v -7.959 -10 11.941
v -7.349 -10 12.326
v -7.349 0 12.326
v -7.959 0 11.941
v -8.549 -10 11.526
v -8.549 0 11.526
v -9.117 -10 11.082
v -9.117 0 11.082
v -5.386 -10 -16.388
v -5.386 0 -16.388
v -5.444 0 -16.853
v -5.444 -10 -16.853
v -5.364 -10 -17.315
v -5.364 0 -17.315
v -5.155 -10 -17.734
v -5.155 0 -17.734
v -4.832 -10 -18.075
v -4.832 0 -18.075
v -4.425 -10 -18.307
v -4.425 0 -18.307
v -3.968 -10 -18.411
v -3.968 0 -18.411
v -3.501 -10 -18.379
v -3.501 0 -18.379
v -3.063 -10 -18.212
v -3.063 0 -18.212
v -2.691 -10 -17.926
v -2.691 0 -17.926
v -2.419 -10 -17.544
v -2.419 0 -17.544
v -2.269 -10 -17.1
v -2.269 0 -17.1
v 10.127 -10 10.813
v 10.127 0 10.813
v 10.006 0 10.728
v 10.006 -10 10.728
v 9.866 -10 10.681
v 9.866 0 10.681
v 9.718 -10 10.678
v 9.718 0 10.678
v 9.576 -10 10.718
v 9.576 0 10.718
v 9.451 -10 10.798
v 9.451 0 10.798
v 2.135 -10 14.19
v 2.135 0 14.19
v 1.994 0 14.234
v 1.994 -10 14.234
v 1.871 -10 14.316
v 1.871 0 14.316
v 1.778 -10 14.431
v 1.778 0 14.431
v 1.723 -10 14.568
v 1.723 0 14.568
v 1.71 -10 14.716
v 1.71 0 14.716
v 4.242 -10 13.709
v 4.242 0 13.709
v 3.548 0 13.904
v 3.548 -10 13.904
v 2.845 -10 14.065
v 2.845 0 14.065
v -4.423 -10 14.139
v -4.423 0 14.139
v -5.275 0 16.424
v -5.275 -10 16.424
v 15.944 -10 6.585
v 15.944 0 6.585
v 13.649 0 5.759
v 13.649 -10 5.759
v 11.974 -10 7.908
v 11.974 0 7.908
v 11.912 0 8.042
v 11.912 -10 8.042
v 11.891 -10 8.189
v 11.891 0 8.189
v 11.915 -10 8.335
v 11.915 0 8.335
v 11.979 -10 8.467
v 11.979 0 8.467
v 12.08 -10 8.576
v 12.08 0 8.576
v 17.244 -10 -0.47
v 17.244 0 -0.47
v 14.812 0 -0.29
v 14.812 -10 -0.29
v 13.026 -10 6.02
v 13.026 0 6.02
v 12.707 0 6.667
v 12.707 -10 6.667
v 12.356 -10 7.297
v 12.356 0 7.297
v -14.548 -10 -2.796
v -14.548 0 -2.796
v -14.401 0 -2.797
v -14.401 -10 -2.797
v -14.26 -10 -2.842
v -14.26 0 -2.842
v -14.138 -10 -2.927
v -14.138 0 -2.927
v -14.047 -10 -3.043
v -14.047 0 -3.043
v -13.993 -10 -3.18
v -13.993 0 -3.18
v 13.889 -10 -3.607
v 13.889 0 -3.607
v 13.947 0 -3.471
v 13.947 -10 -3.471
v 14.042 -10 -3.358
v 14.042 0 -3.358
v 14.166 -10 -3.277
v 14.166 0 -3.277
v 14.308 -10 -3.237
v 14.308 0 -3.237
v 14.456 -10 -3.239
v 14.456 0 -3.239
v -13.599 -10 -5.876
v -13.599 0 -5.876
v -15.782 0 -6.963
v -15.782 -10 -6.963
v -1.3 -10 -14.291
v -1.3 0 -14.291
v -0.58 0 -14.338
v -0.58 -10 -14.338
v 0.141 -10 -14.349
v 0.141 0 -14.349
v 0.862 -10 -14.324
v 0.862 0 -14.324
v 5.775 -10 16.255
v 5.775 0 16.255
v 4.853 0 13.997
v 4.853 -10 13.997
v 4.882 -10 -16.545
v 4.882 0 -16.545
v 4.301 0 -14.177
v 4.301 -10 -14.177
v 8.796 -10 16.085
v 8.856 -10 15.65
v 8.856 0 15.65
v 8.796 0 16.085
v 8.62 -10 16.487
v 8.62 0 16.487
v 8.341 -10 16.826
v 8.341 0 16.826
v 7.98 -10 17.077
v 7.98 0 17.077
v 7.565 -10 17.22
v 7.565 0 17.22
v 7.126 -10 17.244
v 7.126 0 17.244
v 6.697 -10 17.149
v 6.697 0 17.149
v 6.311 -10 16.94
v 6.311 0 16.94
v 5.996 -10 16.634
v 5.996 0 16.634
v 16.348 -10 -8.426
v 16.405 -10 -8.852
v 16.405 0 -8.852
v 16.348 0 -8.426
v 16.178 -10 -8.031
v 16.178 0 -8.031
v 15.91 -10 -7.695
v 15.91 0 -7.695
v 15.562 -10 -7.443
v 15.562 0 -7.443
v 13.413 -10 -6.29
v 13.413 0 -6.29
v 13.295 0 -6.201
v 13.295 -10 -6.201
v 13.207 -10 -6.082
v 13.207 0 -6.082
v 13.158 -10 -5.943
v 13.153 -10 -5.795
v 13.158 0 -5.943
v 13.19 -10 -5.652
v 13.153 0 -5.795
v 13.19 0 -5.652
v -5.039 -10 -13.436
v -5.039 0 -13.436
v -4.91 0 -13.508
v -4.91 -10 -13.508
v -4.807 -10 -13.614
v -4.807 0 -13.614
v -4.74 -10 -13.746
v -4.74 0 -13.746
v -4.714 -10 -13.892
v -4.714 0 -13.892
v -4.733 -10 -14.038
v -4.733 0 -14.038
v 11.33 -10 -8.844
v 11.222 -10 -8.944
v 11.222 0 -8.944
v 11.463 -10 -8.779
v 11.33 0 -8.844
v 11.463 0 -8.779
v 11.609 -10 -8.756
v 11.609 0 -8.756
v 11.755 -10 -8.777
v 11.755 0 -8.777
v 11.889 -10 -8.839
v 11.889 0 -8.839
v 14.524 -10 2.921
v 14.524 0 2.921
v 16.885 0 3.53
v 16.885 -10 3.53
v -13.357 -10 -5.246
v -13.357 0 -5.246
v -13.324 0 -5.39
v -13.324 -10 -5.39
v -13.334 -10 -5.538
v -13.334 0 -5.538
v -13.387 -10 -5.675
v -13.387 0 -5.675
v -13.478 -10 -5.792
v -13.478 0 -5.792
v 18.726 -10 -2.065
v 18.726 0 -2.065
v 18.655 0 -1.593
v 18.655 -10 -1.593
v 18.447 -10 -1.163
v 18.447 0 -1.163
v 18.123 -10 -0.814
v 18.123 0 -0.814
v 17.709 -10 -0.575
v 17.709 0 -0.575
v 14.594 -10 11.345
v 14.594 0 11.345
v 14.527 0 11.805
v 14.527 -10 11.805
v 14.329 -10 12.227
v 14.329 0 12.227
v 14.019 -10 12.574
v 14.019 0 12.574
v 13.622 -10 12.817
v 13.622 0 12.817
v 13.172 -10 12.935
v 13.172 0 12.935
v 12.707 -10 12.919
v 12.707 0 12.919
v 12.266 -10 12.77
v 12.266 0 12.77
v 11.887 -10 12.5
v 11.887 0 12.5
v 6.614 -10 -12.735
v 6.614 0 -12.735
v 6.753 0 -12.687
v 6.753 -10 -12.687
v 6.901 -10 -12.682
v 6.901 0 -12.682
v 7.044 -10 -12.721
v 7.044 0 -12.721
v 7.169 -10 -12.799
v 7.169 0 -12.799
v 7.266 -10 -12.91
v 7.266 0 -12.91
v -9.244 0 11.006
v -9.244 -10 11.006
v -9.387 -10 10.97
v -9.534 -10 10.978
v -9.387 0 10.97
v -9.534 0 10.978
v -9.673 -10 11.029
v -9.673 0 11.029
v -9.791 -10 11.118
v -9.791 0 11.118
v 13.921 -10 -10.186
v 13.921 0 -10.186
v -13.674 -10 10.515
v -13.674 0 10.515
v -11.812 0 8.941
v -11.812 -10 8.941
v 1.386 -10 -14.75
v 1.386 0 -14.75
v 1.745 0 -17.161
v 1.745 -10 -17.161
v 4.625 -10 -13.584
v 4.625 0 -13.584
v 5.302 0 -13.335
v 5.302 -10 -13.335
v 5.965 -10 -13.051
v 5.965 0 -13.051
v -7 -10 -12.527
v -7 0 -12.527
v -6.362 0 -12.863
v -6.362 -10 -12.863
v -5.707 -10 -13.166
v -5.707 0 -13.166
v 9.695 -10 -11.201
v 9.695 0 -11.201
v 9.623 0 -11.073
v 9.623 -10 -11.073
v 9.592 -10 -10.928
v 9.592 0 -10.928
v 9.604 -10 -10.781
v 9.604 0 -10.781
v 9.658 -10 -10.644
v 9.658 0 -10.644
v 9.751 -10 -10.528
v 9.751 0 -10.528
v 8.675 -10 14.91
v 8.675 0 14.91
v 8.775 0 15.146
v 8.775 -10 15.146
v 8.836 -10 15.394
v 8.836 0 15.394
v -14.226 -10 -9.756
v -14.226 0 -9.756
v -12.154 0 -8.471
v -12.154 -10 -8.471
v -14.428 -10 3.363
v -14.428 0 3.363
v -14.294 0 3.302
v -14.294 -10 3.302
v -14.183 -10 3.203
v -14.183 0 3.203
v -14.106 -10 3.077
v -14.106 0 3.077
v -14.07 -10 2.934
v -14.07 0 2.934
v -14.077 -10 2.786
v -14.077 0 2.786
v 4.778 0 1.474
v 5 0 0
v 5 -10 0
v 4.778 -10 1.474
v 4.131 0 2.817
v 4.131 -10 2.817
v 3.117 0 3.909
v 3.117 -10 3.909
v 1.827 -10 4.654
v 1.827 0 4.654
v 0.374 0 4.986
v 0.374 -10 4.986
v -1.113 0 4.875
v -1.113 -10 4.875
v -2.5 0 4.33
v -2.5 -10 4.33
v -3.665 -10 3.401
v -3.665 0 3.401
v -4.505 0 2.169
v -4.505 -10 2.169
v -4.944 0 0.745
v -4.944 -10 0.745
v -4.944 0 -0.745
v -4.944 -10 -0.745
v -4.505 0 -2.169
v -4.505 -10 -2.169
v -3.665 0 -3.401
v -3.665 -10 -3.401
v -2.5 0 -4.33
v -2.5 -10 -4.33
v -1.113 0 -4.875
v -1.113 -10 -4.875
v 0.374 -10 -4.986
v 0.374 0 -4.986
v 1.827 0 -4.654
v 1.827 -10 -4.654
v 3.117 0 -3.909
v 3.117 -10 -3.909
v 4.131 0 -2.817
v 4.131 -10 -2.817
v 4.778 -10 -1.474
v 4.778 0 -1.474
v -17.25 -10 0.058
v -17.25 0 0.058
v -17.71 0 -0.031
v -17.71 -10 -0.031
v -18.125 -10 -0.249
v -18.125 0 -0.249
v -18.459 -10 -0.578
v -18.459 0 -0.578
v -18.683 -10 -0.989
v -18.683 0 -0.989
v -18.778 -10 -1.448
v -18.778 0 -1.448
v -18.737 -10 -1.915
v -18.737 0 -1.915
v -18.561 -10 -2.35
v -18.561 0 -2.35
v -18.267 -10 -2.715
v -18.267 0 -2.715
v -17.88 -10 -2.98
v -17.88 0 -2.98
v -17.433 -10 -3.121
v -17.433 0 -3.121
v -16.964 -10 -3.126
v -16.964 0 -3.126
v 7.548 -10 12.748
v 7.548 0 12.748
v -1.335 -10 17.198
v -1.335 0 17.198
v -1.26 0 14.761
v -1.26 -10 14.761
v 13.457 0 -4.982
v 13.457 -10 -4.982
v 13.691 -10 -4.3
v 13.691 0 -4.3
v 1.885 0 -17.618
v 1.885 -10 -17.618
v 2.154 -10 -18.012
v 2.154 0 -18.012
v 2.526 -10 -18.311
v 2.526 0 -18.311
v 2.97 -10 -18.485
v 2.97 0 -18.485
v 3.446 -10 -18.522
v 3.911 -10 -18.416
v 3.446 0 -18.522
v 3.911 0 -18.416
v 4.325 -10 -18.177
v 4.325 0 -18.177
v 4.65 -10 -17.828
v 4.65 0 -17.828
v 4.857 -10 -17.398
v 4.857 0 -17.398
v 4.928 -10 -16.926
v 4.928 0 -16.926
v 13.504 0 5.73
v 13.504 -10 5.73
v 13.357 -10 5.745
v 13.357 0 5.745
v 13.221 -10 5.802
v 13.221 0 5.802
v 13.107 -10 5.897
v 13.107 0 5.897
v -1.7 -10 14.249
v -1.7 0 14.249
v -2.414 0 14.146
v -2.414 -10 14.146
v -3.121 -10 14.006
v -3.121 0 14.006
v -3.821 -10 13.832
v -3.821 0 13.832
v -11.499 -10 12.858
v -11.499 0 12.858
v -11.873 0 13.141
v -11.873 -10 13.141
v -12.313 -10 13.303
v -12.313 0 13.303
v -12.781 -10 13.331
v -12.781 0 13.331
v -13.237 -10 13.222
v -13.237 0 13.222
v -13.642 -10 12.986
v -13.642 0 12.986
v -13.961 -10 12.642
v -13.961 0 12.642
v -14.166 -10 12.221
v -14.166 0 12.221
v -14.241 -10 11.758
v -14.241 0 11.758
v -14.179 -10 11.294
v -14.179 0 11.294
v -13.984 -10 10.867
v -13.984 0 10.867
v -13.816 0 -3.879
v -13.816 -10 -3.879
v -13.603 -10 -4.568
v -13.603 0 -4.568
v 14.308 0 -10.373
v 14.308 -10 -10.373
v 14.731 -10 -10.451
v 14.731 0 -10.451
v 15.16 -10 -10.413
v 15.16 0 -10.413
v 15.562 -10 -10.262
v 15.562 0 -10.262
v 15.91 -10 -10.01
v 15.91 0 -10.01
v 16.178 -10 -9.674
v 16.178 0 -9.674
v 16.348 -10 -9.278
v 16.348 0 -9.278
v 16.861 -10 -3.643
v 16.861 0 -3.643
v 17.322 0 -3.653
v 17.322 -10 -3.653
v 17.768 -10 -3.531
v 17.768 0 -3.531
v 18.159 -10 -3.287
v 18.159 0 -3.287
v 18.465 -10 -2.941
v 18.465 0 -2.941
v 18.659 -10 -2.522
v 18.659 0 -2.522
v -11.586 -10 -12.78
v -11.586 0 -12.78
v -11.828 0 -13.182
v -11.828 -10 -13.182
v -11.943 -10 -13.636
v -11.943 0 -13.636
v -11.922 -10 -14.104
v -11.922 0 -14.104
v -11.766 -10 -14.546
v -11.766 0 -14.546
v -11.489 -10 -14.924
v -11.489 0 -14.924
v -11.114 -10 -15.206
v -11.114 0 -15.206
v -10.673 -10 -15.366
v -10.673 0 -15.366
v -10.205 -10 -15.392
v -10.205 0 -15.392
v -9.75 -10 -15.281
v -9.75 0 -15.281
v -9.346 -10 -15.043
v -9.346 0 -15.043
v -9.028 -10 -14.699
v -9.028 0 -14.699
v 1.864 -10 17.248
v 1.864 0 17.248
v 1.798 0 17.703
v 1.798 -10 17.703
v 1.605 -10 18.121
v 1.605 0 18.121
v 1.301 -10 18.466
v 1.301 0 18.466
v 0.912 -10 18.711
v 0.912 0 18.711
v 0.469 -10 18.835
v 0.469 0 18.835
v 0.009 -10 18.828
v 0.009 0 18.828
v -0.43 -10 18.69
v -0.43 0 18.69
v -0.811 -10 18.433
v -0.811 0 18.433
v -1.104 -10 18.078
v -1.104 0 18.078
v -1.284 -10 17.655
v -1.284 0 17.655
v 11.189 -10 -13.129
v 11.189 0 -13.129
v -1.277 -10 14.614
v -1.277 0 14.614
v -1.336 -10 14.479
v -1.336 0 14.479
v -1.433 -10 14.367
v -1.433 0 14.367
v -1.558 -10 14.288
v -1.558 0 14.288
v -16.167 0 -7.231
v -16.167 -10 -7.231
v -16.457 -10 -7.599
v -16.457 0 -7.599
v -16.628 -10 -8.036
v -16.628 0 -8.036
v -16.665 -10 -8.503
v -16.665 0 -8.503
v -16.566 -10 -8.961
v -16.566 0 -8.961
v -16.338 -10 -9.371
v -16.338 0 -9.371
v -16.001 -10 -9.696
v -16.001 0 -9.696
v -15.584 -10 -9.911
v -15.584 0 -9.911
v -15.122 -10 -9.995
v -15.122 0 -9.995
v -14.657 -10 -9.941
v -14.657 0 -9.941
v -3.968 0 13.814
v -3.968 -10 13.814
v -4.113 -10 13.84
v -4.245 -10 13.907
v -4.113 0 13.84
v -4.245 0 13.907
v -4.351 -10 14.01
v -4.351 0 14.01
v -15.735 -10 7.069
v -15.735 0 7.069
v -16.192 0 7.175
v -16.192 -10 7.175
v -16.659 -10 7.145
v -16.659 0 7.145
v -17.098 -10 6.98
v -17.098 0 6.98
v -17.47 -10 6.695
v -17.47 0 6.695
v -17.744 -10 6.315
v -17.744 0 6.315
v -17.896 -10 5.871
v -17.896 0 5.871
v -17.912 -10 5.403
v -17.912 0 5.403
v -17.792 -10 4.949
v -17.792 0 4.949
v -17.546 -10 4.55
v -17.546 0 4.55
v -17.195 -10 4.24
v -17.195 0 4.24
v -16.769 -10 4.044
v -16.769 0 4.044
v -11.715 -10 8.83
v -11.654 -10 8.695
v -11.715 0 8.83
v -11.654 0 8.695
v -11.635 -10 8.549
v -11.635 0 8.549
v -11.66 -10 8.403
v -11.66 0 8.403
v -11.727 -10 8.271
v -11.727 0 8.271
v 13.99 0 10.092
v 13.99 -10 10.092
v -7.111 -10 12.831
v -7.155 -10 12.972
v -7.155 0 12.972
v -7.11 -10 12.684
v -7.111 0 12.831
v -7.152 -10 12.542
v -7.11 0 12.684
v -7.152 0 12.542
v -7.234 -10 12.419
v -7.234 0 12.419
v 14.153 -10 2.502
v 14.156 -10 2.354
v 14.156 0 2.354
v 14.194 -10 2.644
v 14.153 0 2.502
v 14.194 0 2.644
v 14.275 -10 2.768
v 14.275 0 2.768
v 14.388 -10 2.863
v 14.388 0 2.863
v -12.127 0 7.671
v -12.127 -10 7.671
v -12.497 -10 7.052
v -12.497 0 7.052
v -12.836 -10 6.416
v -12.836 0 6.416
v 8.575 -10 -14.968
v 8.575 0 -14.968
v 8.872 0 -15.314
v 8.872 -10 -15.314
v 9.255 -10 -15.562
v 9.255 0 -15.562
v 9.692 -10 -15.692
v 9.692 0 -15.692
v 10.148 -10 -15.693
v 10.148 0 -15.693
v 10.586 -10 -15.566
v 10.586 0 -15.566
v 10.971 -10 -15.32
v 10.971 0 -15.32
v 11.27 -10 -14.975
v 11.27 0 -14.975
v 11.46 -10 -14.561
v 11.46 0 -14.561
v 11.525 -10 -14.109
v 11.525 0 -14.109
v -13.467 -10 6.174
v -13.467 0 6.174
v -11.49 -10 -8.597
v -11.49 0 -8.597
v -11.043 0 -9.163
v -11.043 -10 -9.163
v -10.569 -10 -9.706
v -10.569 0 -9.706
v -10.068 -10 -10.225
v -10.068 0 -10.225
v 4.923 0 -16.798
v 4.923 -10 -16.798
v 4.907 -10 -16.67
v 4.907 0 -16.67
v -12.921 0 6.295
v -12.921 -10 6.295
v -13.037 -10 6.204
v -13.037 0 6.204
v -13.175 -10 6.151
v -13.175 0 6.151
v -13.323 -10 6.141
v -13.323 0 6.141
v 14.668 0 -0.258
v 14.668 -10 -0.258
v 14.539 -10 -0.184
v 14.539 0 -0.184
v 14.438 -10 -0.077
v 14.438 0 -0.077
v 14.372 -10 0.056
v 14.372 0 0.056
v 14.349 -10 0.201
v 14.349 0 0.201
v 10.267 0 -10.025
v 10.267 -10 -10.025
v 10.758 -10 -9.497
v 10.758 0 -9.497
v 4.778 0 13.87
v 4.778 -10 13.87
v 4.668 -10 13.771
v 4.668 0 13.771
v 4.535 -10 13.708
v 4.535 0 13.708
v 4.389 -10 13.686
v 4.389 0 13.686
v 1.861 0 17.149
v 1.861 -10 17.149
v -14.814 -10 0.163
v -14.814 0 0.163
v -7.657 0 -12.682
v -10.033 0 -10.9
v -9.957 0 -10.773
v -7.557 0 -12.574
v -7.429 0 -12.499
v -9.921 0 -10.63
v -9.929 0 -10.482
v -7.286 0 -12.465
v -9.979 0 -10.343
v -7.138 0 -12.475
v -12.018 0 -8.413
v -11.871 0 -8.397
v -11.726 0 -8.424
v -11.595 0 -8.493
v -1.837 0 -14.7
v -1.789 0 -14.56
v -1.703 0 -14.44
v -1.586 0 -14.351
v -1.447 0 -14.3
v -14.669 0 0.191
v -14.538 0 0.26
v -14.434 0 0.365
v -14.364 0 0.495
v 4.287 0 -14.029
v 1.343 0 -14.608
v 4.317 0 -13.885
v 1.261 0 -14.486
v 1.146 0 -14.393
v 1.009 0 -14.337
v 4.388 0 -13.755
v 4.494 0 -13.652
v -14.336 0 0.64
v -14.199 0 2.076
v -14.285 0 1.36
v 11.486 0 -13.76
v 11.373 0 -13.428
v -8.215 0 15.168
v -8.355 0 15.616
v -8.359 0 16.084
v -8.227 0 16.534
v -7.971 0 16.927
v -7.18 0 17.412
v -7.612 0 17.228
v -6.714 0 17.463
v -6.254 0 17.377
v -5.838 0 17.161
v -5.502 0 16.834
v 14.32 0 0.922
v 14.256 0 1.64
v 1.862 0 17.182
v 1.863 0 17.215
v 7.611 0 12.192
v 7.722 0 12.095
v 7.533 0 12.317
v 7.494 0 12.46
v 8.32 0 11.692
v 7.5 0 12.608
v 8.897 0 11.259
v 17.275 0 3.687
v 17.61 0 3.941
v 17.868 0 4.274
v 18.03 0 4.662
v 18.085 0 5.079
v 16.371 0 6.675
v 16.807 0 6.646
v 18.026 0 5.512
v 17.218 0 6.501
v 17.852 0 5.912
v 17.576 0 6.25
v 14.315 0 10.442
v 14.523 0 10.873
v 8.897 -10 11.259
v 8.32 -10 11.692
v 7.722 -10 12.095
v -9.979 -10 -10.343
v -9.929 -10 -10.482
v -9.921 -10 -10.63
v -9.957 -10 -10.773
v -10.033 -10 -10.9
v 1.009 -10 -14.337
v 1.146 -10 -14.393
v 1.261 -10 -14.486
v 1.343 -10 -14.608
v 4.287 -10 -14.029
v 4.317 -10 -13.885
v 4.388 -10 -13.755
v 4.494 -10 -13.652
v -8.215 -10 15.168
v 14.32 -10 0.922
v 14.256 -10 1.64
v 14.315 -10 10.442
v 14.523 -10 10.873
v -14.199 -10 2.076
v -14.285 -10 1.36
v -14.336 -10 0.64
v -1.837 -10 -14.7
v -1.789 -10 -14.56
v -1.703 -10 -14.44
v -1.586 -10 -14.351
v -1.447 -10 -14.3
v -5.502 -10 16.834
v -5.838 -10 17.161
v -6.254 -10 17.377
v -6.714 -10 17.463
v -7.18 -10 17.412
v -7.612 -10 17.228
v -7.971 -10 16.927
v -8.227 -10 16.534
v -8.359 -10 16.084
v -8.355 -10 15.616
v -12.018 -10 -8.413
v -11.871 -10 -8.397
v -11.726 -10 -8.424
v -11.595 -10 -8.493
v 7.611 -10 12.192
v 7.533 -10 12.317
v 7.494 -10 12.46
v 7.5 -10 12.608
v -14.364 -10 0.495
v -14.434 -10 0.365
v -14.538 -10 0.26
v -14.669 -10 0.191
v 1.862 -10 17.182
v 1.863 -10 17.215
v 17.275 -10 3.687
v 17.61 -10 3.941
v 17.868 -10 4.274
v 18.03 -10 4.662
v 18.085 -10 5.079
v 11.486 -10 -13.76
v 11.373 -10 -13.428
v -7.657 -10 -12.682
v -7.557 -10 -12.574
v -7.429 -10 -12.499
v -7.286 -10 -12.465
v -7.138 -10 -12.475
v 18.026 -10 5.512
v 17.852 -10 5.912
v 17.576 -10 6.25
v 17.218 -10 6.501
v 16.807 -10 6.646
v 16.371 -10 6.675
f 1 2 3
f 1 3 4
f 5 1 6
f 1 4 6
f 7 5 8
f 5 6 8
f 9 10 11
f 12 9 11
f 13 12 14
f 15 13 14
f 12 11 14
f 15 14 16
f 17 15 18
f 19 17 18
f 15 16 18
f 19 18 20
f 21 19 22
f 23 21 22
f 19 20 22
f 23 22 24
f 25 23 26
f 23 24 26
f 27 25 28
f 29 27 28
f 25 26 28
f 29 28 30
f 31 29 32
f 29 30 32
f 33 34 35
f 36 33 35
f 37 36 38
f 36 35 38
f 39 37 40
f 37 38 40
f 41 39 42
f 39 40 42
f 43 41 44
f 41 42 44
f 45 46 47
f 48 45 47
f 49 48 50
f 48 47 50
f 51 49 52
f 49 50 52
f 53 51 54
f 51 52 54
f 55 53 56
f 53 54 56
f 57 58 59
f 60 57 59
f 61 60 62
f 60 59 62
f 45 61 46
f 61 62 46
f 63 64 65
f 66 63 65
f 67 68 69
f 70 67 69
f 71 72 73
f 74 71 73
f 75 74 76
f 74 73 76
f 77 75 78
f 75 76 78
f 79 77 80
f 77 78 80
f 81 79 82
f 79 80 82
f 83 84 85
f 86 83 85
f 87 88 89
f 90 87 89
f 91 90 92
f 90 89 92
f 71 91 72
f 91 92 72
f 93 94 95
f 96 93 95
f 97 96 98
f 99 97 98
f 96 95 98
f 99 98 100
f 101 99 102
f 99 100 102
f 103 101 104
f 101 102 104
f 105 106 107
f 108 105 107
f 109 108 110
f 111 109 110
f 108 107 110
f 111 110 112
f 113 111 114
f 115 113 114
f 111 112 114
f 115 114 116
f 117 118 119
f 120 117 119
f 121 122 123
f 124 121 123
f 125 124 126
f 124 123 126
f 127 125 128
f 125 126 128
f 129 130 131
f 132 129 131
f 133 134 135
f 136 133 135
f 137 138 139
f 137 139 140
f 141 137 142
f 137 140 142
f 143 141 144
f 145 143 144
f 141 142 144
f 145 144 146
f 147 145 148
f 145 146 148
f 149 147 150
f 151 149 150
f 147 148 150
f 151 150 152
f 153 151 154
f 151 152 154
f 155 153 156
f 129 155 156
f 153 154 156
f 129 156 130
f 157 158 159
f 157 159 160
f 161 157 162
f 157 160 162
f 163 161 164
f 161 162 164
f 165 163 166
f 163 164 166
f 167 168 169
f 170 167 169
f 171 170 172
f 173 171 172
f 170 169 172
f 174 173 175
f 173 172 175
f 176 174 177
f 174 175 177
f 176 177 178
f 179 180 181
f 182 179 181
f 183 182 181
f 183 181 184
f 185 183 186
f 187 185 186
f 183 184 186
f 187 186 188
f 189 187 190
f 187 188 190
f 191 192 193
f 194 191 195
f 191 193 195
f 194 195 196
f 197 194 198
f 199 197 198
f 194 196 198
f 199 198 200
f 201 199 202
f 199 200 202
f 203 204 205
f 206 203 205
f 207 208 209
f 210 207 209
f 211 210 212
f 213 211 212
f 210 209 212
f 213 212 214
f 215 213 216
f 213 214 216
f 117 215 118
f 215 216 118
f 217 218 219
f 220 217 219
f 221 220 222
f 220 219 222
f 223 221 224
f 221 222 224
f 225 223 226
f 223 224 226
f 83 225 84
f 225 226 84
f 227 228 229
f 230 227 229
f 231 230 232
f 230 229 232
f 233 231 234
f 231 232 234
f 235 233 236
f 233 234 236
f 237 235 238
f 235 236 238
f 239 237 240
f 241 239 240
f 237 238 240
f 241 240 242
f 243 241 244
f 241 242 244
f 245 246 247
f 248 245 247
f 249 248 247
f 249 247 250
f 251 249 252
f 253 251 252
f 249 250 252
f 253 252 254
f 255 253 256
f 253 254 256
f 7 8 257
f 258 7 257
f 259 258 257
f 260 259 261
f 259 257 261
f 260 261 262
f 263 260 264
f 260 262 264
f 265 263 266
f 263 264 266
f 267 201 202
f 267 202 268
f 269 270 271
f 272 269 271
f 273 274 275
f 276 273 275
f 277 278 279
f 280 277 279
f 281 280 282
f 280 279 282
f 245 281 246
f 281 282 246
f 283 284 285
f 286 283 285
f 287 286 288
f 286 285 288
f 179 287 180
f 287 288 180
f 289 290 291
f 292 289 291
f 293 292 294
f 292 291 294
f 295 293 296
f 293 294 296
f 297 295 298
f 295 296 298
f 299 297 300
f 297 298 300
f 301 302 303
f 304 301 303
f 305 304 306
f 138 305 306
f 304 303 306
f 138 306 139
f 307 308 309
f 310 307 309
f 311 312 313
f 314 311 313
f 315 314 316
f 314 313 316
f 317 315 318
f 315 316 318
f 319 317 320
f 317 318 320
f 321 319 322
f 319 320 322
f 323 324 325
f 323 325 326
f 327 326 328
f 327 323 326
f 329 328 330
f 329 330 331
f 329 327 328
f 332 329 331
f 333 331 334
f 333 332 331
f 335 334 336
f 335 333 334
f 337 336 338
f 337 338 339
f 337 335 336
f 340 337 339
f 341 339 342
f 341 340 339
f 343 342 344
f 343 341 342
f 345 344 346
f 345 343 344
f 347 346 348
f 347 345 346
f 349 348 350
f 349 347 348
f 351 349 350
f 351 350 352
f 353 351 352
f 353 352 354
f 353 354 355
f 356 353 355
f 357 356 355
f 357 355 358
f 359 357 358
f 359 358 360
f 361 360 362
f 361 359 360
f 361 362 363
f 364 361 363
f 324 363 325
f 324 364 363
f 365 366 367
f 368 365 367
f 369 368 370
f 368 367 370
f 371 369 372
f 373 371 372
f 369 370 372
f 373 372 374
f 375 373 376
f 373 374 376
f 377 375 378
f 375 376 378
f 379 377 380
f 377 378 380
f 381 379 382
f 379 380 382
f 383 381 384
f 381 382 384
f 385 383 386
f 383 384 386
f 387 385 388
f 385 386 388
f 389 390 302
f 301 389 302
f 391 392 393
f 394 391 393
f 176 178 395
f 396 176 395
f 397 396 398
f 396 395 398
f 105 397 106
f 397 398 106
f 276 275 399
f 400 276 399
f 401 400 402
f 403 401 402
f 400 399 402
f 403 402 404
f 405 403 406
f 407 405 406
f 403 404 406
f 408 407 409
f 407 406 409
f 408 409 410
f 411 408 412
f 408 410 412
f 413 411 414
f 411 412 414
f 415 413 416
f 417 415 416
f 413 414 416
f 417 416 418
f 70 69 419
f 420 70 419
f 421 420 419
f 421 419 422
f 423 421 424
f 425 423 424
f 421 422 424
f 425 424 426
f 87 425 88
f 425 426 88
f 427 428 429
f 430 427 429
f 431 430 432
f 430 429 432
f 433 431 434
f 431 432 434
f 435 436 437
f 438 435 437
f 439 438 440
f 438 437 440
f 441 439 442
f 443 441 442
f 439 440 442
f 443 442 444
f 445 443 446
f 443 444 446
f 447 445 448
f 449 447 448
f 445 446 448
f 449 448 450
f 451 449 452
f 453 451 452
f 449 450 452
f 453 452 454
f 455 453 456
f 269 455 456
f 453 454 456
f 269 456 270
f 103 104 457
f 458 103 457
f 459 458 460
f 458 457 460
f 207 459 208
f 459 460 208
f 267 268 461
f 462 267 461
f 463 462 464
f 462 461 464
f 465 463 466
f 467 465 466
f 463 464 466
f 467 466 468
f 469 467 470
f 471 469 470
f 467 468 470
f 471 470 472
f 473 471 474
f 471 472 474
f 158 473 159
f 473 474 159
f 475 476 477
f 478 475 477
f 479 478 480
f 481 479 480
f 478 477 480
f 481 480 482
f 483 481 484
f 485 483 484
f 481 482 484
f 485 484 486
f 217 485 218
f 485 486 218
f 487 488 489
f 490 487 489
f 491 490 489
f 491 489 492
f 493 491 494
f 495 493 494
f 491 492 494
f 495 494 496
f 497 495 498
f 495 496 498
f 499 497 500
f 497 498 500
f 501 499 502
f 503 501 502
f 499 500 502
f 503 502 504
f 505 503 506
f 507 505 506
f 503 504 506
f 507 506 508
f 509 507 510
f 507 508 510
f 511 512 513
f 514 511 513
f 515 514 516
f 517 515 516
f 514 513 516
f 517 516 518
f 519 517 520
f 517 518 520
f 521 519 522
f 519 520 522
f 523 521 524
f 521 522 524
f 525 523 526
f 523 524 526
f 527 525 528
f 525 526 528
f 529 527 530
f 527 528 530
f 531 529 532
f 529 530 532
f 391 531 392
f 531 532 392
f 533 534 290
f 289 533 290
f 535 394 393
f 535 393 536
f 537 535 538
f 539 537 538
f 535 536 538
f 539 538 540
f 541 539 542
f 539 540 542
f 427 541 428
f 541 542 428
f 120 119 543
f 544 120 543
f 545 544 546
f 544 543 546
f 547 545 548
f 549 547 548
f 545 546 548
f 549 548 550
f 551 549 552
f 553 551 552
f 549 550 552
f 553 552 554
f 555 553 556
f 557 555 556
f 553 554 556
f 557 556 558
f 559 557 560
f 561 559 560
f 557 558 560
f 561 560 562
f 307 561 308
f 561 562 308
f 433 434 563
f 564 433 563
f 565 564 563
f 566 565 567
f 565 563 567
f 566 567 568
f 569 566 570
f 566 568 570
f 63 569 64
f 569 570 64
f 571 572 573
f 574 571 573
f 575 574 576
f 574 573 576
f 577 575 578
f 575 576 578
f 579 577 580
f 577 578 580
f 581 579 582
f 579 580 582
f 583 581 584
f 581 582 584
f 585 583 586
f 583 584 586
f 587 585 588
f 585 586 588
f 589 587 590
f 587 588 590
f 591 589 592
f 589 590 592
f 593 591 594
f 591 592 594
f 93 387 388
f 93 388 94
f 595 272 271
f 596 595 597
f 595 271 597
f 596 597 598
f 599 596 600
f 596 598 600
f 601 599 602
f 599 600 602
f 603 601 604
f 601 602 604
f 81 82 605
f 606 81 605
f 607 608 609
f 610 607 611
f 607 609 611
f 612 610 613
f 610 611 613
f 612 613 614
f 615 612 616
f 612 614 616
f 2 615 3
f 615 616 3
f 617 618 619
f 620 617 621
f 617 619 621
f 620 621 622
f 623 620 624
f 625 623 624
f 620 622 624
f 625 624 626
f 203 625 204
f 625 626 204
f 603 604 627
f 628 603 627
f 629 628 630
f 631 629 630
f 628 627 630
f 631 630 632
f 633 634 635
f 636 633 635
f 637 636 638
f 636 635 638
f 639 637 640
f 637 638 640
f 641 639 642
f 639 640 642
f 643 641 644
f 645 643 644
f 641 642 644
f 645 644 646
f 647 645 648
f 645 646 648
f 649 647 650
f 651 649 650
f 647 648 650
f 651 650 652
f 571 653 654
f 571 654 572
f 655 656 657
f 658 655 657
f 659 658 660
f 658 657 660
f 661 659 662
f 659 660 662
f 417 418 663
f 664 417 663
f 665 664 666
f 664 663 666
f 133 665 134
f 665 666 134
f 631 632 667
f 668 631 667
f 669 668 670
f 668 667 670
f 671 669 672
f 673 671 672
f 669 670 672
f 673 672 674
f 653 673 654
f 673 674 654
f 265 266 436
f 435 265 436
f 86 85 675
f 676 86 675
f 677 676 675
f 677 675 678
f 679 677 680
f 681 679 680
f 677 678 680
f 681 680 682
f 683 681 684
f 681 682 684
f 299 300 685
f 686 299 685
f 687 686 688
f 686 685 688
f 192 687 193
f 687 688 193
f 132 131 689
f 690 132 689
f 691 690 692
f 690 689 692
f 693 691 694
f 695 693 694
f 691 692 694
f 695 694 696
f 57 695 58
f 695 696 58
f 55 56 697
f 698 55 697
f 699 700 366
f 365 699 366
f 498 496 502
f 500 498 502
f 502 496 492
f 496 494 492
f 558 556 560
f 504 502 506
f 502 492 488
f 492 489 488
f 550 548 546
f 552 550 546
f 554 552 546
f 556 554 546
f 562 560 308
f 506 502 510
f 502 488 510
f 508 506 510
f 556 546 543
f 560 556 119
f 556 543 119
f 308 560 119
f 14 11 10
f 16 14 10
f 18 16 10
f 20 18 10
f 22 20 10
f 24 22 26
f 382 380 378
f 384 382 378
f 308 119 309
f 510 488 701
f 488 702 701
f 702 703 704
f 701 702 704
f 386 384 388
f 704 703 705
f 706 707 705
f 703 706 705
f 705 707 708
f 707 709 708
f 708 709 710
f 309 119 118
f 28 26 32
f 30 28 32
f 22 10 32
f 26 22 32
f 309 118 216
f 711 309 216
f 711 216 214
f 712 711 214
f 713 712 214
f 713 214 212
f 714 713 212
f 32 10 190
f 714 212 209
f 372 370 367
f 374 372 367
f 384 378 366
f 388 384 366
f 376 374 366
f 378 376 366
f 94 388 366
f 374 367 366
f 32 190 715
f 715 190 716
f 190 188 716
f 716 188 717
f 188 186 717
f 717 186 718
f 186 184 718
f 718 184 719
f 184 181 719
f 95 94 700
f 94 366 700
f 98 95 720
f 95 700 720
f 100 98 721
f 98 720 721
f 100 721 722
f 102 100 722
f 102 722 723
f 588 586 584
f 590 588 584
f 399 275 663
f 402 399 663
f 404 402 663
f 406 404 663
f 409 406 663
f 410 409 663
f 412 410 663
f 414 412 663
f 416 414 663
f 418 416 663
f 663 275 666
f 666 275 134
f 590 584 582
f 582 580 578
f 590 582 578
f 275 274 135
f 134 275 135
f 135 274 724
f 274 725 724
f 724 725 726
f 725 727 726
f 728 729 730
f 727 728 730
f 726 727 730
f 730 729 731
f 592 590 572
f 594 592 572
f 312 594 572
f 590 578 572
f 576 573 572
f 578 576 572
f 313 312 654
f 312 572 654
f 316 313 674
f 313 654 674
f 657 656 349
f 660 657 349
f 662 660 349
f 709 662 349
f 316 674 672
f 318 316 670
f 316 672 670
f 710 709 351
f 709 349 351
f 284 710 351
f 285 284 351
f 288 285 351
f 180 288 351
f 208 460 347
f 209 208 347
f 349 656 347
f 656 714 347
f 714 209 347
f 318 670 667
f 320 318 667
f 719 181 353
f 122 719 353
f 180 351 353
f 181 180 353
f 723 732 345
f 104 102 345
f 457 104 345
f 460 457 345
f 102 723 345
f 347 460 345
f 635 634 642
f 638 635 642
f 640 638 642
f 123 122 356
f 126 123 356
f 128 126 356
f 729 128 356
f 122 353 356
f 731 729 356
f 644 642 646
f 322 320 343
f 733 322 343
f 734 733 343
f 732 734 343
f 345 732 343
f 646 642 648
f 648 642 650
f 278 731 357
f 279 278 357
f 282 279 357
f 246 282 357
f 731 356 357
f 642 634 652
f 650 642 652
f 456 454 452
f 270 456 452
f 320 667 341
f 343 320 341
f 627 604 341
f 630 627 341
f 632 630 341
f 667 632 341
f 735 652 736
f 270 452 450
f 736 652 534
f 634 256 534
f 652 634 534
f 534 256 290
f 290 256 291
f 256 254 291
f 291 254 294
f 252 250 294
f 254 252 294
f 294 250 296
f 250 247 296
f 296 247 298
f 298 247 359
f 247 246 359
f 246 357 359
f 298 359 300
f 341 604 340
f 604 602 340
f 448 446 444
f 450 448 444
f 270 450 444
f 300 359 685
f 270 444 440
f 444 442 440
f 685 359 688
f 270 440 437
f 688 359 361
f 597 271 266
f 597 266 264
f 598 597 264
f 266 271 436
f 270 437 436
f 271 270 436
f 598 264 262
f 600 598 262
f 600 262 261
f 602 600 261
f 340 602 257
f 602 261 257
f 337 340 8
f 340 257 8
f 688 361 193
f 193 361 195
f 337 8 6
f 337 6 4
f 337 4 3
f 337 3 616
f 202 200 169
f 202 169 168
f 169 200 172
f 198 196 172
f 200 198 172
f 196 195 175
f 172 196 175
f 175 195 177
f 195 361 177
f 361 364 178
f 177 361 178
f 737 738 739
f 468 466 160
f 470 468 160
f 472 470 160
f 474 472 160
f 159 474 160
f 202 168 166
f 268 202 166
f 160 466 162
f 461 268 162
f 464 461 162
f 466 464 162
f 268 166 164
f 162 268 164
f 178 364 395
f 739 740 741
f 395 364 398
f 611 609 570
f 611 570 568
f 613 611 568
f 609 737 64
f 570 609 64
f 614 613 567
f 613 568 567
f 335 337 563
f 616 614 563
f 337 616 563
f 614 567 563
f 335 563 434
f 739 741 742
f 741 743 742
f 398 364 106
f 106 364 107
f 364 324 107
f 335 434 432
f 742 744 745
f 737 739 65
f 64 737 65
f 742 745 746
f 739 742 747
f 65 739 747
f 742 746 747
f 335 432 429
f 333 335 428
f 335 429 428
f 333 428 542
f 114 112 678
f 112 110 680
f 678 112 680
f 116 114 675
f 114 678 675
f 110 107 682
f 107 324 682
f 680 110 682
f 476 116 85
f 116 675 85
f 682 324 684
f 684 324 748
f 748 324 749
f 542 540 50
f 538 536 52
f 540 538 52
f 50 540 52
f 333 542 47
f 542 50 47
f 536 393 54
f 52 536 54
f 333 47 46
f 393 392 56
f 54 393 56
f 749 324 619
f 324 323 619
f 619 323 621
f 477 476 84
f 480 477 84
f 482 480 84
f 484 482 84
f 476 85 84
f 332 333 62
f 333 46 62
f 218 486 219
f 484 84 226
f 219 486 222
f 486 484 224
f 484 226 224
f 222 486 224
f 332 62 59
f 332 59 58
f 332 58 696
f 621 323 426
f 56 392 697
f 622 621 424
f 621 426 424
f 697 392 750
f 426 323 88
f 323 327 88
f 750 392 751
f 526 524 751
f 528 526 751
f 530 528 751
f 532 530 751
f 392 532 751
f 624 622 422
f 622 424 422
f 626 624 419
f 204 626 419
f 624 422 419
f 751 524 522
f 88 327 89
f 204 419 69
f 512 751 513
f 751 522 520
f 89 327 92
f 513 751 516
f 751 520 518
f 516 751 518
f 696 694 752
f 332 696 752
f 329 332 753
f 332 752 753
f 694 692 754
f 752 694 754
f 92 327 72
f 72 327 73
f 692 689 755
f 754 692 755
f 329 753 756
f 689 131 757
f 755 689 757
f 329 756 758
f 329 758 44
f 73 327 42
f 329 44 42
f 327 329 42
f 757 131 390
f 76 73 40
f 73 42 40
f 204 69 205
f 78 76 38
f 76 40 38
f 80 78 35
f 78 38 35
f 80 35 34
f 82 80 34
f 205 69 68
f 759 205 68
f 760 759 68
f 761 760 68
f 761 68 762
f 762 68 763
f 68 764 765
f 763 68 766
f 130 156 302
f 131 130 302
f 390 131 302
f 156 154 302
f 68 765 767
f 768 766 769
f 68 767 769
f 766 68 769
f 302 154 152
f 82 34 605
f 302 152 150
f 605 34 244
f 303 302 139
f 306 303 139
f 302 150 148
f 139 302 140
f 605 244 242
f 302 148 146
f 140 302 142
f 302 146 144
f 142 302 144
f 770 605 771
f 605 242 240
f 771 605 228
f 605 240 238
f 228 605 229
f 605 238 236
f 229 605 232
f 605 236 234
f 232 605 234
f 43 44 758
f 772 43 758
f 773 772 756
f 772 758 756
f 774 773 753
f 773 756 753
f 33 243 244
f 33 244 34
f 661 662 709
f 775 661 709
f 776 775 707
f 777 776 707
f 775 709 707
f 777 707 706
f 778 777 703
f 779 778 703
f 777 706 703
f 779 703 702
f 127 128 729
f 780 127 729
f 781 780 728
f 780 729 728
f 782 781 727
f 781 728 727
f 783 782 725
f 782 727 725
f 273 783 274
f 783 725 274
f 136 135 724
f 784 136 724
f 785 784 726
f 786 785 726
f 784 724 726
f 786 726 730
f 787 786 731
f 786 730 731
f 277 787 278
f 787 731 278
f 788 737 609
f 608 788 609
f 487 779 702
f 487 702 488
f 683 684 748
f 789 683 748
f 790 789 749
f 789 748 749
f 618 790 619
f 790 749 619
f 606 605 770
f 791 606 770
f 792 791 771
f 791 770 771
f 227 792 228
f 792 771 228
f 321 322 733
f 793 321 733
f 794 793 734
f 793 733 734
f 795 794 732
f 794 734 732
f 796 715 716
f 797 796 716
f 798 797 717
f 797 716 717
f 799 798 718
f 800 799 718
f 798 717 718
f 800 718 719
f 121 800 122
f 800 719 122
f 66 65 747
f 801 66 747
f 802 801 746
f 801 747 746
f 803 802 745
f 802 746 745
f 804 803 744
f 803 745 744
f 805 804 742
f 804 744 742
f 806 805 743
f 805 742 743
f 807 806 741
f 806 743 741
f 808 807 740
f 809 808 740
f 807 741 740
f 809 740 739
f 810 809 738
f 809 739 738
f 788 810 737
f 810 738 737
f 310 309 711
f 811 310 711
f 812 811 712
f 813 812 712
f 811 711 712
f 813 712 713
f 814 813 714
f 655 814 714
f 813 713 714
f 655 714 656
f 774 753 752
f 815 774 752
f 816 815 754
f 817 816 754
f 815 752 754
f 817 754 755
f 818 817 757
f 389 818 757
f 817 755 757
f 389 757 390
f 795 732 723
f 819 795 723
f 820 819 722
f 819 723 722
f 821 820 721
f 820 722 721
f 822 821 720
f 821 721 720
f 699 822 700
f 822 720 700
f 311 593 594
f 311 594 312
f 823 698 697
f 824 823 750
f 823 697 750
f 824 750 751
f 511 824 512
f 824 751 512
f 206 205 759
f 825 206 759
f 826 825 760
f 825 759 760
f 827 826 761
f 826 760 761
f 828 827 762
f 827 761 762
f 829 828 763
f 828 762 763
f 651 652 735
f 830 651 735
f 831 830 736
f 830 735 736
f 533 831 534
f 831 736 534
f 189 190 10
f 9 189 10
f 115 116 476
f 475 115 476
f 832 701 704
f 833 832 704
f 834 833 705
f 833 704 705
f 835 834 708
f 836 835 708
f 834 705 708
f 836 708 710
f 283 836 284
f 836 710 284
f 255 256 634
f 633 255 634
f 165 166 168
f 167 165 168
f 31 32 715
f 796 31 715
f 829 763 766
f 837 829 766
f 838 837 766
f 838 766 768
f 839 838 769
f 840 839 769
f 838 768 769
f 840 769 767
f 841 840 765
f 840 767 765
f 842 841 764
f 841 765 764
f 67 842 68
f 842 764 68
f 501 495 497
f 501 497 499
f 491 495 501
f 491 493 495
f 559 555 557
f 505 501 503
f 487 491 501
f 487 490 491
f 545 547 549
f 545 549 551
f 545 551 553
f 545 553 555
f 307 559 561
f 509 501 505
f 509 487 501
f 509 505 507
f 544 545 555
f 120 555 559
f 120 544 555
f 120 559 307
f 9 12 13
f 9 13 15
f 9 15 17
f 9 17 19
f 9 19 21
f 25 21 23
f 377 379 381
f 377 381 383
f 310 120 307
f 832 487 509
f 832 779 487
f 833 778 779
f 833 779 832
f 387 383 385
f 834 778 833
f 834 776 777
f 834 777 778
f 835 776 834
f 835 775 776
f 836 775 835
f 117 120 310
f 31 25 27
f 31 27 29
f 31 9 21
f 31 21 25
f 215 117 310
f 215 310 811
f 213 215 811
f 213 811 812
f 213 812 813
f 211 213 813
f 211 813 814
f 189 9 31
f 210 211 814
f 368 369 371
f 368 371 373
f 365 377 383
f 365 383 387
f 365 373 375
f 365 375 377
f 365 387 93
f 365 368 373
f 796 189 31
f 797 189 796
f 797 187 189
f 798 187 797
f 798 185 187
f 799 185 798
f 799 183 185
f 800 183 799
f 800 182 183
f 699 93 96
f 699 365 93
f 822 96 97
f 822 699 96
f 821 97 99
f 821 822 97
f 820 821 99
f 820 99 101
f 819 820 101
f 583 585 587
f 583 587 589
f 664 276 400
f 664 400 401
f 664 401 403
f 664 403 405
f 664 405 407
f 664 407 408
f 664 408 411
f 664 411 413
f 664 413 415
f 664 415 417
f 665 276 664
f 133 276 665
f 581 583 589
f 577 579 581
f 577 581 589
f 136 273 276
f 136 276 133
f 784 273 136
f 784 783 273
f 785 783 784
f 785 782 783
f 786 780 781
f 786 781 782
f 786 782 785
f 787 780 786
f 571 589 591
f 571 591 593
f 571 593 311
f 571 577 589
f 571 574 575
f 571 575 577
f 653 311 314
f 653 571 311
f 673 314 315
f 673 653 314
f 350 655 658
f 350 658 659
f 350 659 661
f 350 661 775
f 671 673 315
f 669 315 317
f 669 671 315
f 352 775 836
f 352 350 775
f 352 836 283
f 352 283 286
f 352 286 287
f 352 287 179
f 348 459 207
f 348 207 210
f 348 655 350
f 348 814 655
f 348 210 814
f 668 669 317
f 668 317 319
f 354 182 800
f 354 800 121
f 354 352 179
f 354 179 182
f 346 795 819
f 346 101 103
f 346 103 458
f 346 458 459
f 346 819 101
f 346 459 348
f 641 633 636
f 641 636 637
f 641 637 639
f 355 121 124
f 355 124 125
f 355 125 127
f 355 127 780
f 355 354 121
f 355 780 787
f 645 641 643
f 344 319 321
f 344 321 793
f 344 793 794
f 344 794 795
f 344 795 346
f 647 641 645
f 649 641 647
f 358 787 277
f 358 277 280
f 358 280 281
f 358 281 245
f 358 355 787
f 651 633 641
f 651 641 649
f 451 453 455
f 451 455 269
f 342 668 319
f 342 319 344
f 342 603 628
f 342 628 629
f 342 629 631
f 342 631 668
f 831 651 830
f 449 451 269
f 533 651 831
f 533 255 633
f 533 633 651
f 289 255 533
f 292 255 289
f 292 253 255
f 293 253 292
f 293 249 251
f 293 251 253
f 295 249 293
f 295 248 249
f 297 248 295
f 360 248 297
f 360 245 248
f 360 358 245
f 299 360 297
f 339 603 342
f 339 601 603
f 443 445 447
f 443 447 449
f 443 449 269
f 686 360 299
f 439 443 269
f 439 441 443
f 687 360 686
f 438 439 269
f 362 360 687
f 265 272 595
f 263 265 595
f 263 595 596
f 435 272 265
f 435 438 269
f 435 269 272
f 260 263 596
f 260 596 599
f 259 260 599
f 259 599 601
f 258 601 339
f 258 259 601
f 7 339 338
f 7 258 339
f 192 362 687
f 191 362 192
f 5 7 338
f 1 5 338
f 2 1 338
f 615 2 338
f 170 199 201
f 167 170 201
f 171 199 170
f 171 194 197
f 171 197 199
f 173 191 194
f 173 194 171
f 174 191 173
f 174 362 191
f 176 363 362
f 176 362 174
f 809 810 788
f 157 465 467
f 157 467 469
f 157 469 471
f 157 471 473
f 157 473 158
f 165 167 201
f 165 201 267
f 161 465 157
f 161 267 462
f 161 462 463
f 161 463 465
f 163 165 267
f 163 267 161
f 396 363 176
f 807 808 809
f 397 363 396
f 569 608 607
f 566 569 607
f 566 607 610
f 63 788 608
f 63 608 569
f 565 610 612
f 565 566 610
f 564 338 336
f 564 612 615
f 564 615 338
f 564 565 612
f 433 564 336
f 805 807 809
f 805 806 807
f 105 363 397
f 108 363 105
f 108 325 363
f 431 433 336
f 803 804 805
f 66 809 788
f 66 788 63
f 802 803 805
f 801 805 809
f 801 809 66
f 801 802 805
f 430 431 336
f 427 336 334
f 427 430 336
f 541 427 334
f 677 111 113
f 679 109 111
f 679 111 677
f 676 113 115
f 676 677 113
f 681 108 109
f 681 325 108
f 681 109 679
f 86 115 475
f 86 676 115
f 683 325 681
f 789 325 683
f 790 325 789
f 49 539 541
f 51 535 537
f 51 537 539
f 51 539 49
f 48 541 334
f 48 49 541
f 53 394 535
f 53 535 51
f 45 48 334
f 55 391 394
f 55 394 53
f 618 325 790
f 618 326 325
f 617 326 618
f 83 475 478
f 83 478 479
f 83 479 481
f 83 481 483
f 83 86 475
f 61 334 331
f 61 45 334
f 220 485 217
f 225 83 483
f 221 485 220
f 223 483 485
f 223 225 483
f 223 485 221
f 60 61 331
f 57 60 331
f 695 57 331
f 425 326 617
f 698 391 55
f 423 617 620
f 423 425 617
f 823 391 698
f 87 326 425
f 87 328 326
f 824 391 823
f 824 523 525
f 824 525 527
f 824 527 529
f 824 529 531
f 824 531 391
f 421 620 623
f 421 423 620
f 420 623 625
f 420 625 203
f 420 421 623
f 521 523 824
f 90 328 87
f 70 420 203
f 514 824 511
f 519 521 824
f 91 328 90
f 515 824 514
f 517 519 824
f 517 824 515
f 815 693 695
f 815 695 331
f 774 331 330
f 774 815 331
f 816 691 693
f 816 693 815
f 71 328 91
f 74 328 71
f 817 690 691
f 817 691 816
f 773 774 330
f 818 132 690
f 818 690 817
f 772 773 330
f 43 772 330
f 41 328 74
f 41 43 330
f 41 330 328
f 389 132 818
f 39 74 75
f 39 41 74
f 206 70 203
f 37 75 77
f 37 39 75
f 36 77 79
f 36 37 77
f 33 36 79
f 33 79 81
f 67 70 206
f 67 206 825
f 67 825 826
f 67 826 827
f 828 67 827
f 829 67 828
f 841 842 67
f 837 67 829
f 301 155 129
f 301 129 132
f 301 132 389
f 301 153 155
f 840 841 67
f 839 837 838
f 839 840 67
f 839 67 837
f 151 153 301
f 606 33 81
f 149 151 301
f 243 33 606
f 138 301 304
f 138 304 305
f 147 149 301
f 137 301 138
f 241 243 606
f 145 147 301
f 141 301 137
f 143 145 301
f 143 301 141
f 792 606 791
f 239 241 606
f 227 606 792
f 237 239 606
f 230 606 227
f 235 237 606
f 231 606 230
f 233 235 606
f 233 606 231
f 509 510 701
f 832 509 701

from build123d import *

# Parameters (mm, degrees)
F0_R     = 5
F1_DEPTH = 10


with BuildPart() as f1:
    # F0 (on Front) → F1 (new body)
    with BuildSketch(Plane.XZ):
        with BuildLine():
            ThreePointArc((13.88936, -3.606687), (14.234374, -1.817992), (14.35, 0))
            ThreePointArc((14.35, 0), (14.349647, 0.100694), (14.348587, 0.201382))
            ThreePointArc((14.348587, 0.201382), (14.29266, 1.281551), (14.155533, 2.354439))
            ThreePointArc((14.155533, 2.354439), (13.713882, 4.225157), (13.026177, 6.020068))
            ThreePointArc((13.026177, 6.020068), (12.535741, 6.984104), (11.974086, 7.908461))
            ThreePointArc((11.974086, 7.908461), (10.809728, 9.437811), (9.451422, 10.797829))
            ThreePointArc((9.451422, 10.797829), (8.611278, 11.479041), (7.722211, 12.095038))
            ThreePointArc((7.722211, 12.095038), (6.036474, 13.018582), (4.242431, 13.708548))
            ThreePointArc((4.242431, 13.708548), (3.197847, 13.989148), (2.135096, 14.190274))
            ThreePointArc((2.135096, 14.190274), (0.219459, 14.348322), (-1.700115, 14.248934))
            ThreePointArc((-1.700115, 14.248934), (-2.76852, 14.080405), (-3.821197, 13.831882))
            ThreePointArc((-3.821197, 13.831882), (-5.635502, 13.197106), (-7.348696, 12.32555))
            ThreePointArc((-7.348696, 12.32555), (-8.256186, 11.737031), (-9.116771, 11.081832))
            ThreePointArc((-9.116771, 11.081832), (-10.516034, 9.763991), (-11.72662, 8.270966))
            ThreePointArc((-11.72662, 8.270966), (-12.316282, 7.364218), (-12.835971, 6.415632))
            ThreePointArc((-12.835971, 6.415632), (-13.578248, 4.642593), (-14.076906, 2.786257))
            ThreePointArc((-14.076906, 2.786257), (-14.24678, 1.718065), (-14.335716, 0.640112))
            ThreePointArc((-14.335716, 0.640112), (-14.29266, -1.281551), (-13.993166, -3.18022))
            ThreePointArc((-13.993166, -3.18022), (-13.713882, -4.225157), (-13.356685, -5.24609))
            ThreePointArc((-13.356685, -5.24609), (-12.535741, -6.984104), (-11.489881, -8.596809))
            ThreePointArc((-11.489881, -8.596809), (-10.809728, -9.437811), (-10.068162, -10.225195))
            ThreePointArc((-10.068162, -10.225195), (-8.611278, -11.479041), (-6.999891, -12.526932))
            ThreePointArc((-6.999891, -12.526932), (-6.036474, -13.018582), (-5.038763, -13.436271))
            ThreePointArc((-5.038763, -13.436271), (-3.197847, -13.989148), (-1.299557, -14.291034))
            ThreePointArc((-1.299557, -14.291034), (-0.219459, -14.348322), (0.861885, -14.324093))
            ThreePointArc((0.861885, -14.324093), (2.76852, -14.080405), (4.625483, -13.584087))
            ThreePointArc((4.625483, -13.584087), (5.635502, -13.197106), (6.613505, -12.73515))
            ThreePointArc((6.613505, -12.73515), (8.256186, -11.737031), (9.750735, -10.528327))
            ThreePointArc((9.750735, -10.528327), (10.516034, -9.763991), (11.22159, -8.944184))
            ThreePointArc((11.22159, -8.944184), (12.316282, -7.364218), (13.189996, -5.652124))
            ThreePointArc((13.189996, -5.652124), (13.578248, -4.642593), (13.88936, -3.606687))
        make_face()
        Circle(F0_R, mode=Mode.SUBTRACT)
        with BuildLine():
            ThreePointArc((14.348587, 0.201382), (14.349647, 0.100694), (14.35, 0))
            ThreePointArc((14.35, 0), (14.234374, -1.817992), (13.88936, -3.606687))
            ThreePointArc((13.88936, -3.606687), (14.101323, -3.312804), (14.456129, -3.239262))
            Line((14.456129, -3.239262), (16.860896, -3.643168))
            ThreePointArc((16.860896, -3.643168), (15.53743, -1.873709), (17.243607, -0.469604))
            Line((17.243607, -0.469604), (14.811761, -0.290247))
            ThreePointArc((14.811761, -0.290247), (14.484609, -0.134466), (14.348587, 0.201382))
        make_face()
        with BuildLine():
            ThreePointArc((13.026177, 6.020068), (13.713882, 4.225157), (14.155533, 2.354439))
            ThreePointArc((14.155533, 2.354439), (14.229639, 2.709128), (14.523858, 2.920624))
            Line((14.523858, 2.920624), (16.885005, 3.529745))
            ThreePointArc((16.885005, 3.529745), (14.956254, 4.607924), (15.943824, 6.584602))
            Line((15.943824, 6.584602), (13.649271, 5.759332))
            ThreePointArc((13.649271, 5.759332), (13.287041, 5.768581), (13.026177, 6.020068))
        make_face()
        with BuildLine():
            ThreePointArc((13.413163, -6.289639), (13.177657, -6.014262), (13.189996, -5.652124))
            ThreePointArc((13.189996, -5.652124), (12.316282, -7.364218), (11.22159, -8.944184))
            ThreePointArc((11.22159, -8.944184), (11.534761, -8.761922), (11.888805, -8.839051))
            Line((11.888805, -8.839051), (13.921385, -10.186144))
            ThreePointArc((13.921385, -10.186144), (13.432042, -8.03136), (15.561814, -7.442611))
            Line((15.561814, -7.442611), (13.413163, -6.289639))
        make_face()
        with BuildLine():
            ThreePointArc((18.725921, -2.06527), (18.298162, -0.976302), (17.243607, -0.469604))
            ThreePointArc((17.243607, -0.469604), (15.53743, -1.873709), (16.860896, -3.643168))
            ThreePointArc((16.860896, -3.643168), (18.159352, -3.286752), (18.725921, -2.06527))
        make_face()
        with BuildLine():
            ThreePointArc((9.451422, 10.797829), (10.809728, 9.437811), (11.974086, 7.908461))
            ThreePointArc((11.974086, 7.908461), (11.89752, 8.262627), (12.08028, 8.575508))
            Line((12.08028, 8.575508), (13.989543, 10.092333))
            ThreePointArc((13.989543, 10.092333), (11.789006, 10.292805), (11.887209, 12.500271))
            Line((11.887209, 12.500271), (10.126698, 10.81307))
            ThreePointArc((10.126698, 10.81307), (9.792023, 10.674187), (9.451422, 10.797829))
        make_face()
        with BuildLine():
            ThreePointArc((15.943824, 6.584602), (14.956254, 4.607924), (16.885005, 3.529745))
            ThreePointArc((16.885005, 3.529745), (17.750137, 4.099094), (18.085328, 5.079022))
            ThreePointArc((18.085328, 5.079022), (17.405543, 6.387916), (15.943824, 6.584602))
        make_face()
        with BuildLine():
            ThreePointArc((9.695307, -11.201496), (9.592168, -10.854137), (9.750735, -10.528327))
            ThreePointArc((9.750735, -10.528327), (8.256186, -11.737031), (6.613505, -12.73515))
            ThreePointArc((6.613505, -12.73515), (6.973734, -12.696024), (7.265798, -12.910487))
            Line((7.265798, -12.910487), (8.574741, -14.967843))
            ThreePointArc((8.574741, -14.967843), (9.004133, -12.800316), (11.189241, -13.128723))
            Line((11.189241, -13.128723), (9.695307, -11.201496))
        make_face()
        with BuildLine():
            ThreePointArc((16.405286, -8.852457), (16.17832, -8.031009), (15.561814, -7.442611))
            ThreePointArc((15.561814, -7.442611), (13.432042, -8.03136), (13.921385, -10.186144))
            ThreePointArc((13.921385, -10.186144), (15.562174, -10.26211), (16.405286, -8.852457))
        make_face()
        with BuildLine():
            ThreePointArc((4.242431, 13.708548), (6.036474, 13.018582), (7.722211, 12.095038))
            ThreePointArc((7.722211, 12.095038), (7.508212, 12.387443), (7.547911, 12.747609))
            Line((7.547911, 12.747609), (8.675162, 14.909865))
            ThreePointArc((8.675162, 14.909865), (6.583332, 14.197966), (5.775187, 16.254529))
            Line((5.775187, 16.254529), (4.853127, 13.99713))
            ThreePointArc((4.853127, 13.99713), (4.603875, 13.73413), (4.242431, 13.708548))
        make_face()
        with BuildLine():
            ThreePointArc((11.887209, 12.500271), (11.789006, 10.292805), (13.989543, 10.092333))
            ThreePointArc((13.989543, 10.092333), (14.435181, 10.649559), (14.594272, 11.345104))
            ThreePointArc((14.594272, 11.345104), (13.622244, 12.816719), (11.887209, 12.500271))
        make_face()
        with BuildLine():
            ThreePointArc((4.301045, -14.176513), (4.348106, -13.817234), (4.625483, -13.584087))
            ThreePointArc((4.625483, -13.584087), (2.76852, -14.080405), (0.861885, -14.324093))
            ThreePointArc((0.861885, -14.324093), (1.206885, -14.434868), (1.386468, -14.749583))
            Line((1.386468, -14.749583), (1.745445, -17.161466))
            ThreePointArc((1.745445, -17.161466), (3.019327, -15.355981), (4.881948, -16.54476))
            Line((4.881948, -16.54476), (4.301045, -14.176513))
        make_face()
        with BuildLine():
            ThreePointArc((11.524683, -14.108975), (11.438502, -13.590946), (11.189241, -13.128723))
            ThreePointArc((11.189241, -13.128723), (9.004133, -12.800316), (8.574741, -14.967843))
            ThreePointArc((8.574741, -14.967843), (10.371948, -15.645189), (11.524683, -14.108975))
        make_face()
        with BuildLine():
            ThreePointArc((-1.700115, 14.248934), (0.219459, 14.348322), (2.135096, 14.190274))
            ThreePointArc((2.135096, 14.190274), (1.820666, 14.370357), (1.71044, 14.715532))
            Line((1.71044, 14.715532), (1.860767, 17.149345))
            ThreePointArc((1.860767, 17.149345), (0.239341, 15.64817), (-1.335416, 17.198231))
            Line((-1.335416, 17.198231), (-1.259594, 14.760959))
            ThreePointArc((-1.259594, 14.760959), (-1.380325, 14.419317), (-1.700115, 14.248934))
        make_face()
        with BuildLine():
            ThreePointArc((5.775187, 16.254529), (6.583332, 14.197966), (8.675162, 14.909865))
            ThreePointArc((8.675162, 14.909865), (8.810422, 15.268751), (8.856389, 15.649515))
            ThreePointArc((8.856389, 15.649515), (7.564672, 17.219535), (5.775187, 16.254529))
        make_face()
        with BuildLine():
            ThreePointArc((-1.836907, -14.700281), (-1.647783, -14.391206), (-1.299557, -14.291034))
            ThreePointArc((-1.299557, -14.291034), (-3.197847, -13.989148), (-5.038763, -13.436271))
            ThreePointArc((-5.038763, -13.436271), (-4.768646, -13.677792), (-4.732594, -14.038342))
            Line((-4.732594, -14.038342), (-5.385654, -16.387716))
            ThreePointArc((-5.385654, -16.387716), (-3.627864, -15.230903), (-2.244102, -16.816224))
            ThreePointArc((-2.244102, -16.816224), (-2.250459, -16.958707), (-2.269479, -17.100057))
            Line((-2.269479, -17.100057), (-1.836907, -14.700281))
        make_face()
        with BuildLine():
            ThreePointArc((4.928012, -16.925922), (4.916454, -16.733954), (4.881948, -16.54476))
            ThreePointArc((4.881948, -16.54476), (3.019327, -15.355981), (1.745445, -17.161466))
            ThreePointArc((1.745445, -17.161466), (3.446106, -18.521558), (4.928012, -16.925922))
        make_face()
        with BuildLine():
            ThreePointArc((-7.348696, 12.32555), (-5.635502, 13.197106), (-3.821197, 13.831882))
            ThreePointArc((-3.821197, 13.831882), (-4.181689, 13.868506), (-4.422781, 14.139007))
            Line((-4.422781, 14.139007), (-5.275372, 16.423549))
            ThreePointArc((-5.275372, 16.423549), (-5.199834, 16.148354), (-5.174384, 15.864117))
            ThreePointArc((-5.174384, 15.864117), (-6.417431, 14.304443), (-8.215115, 15.168203))
            Line((-8.215115, 15.168203), (-7.154519, 12.972484))
            ThreePointArc((-7.154519, 12.972484), (-7.125854, 12.611272), (-7.348696, 12.32555))
        make_face()
        with BuildLine():
            ThreePointArc((-1.335416, 17.198231), (0.239341, 15.64817), (1.860767, 17.149345))
            ThreePointArc((1.860767, 17.149345), (1.863049, 17.198641), (1.86381, 17.247983))
            ThreePointArc((1.86381, 17.247983), (0.238931, 18.847789), (-1.335416, 17.198231))
        make_face()
        with BuildLine():
            ThreePointArc((-7.657241, -12.682238), (-7.358755, -12.476807), (-6.999891, -12.526932))
            ThreePointArc((-6.999891, -12.526932), (-8.611278, -11.479041), (-10.068162, -10.225195))
            ThreePointArc((-10.068162, -10.225195), (-9.919634, -10.555702), (-10.033348, -10.899744))
            Line((-10.033348, -10.899744), (-11.585524, -12.780381))
            ThreePointArc((-11.585524, -12.780381), (-9.810417, -12.293128), (-8.751536, -13.798848))
            ThreePointArc((-8.751536, -13.798848), (-8.822342, -14.269554), (-9.028492, -14.6986))
            Line((-9.028492, -14.6986), (-7.657241, -12.682238))
        make_face()
        with BuildLine():
            ThreePointArc((-5.385654, -16.387716), (-4.200657, -18.375989), (-2.269479, -17.100057))
            ThreePointArc((-2.269479, -17.100057), (-2.250459, -16.958707), (-2.244102, -16.816224))
            ThreePointArc((-2.244102, -16.816224), (-3.627864, -15.230903), (-5.385654, -16.387716))
        make_face()
        with BuildLine():
            ThreePointArc((-11.72662, 8.270966), (-10.516034, 9.763991), (-9.116771, 11.081832))
            ThreePointArc((-9.116771, 11.081832), (-9.460993, 10.968664), (-9.791264, 11.117718))
            Line((-9.791264, 11.117718), (-11.499351, 12.857971))
            ThreePointArc((-11.499351, 12.857971), (-11.160179, 12.342595), (-11.041226, 11.737202))
            ThreePointArc((-11.041226, 11.737202), (-11.967798, 10.285825), (-13.674345, 10.515455))
            Line((-13.674345, 10.515455), (-11.812364, 8.940949))
            ThreePointArc((-11.812364, 8.940949), (-11.639258, 8.622625), (-11.72662, 8.270966))
        make_face()
        with BuildLine():
            ThreePointArc((-5.174384, 15.864117), (-5.199834, 16.148354), (-5.275372, 16.423549))
            ThreePointArc((-5.275372, 16.423549), (-7.402733, 17.335572), (-8.215115, 15.168203))
            ThreePointArc((-8.215115, 15.168203), (-6.417431, 14.304443), (-5.174384, 15.864117))
        make_face()
        with BuildLine():
            ThreePointArc((-12.153569, -8.47132), (-11.797332, -8.405055), (-11.489881, -8.596809))
            ThreePointArc((-11.489881, -8.596809), (-12.535741, -6.984104), (-13.356685, -5.24609))
            ThreePointArc((-13.356685, -5.24609), (-13.355427, -5.608435), (-13.599245, -5.876481))
            Line((-13.599245, -5.876481), (-15.782152, -6.963202))
            ThreePointArc((-15.782152, -6.963202), (-14.226745, -7.035215), (-13.469096, -8.395525))
            ThreePointArc((-13.469096, -8.395525), (-13.671184, -9.173883), (-14.226397, -9.75562))
            Line((-14.226397, -9.75562), (-12.153569, -8.47132))
        make_face()
        with BuildLine():
            ThreePointArc((-11.585524, -12.780381), (-11.311679, -15.078741), (-9.028492, -14.6986))
            ThreePointArc((-9.028492, -14.6986), (-8.822342, -14.269554), (-8.751536, -13.798848))
            ThreePointArc((-8.751536, -13.798848), (-9.810417, -12.293128), (-11.585524, -12.780381))
        make_face()
        with BuildLine():
            ThreePointArc((-14.076906, 2.786257), (-13.578248, 4.642593), (-12.835971, 6.415632))
            ThreePointArc((-12.835971, 6.415632), (-13.104405, 6.172241), (-13.466748, 6.174075))
            Line((-13.466748, 6.174075), (-15.734988, 7.069133))
            ThreePointArc((-15.734988, 7.069133), (-14.99947, 6.480908), (-14.722285, 5.580818))
            ThreePointArc((-14.722285, 5.580818), (-15.361815, 4.30117), (-16.769156, 4.044489))
            Line((-16.769156, 4.044489), (-14.427743, 3.363442))
            ThreePointArc((-14.427743, 3.363442), (-14.140129, 3.143047), (-14.076906, 2.786257))
        make_face()
        with BuildLine():
            ThreePointArc((-11.041226, 11.737202), (-11.160179, 12.342595), (-11.499351, 12.857971))
            ThreePointArc((-11.499351, 12.857971), (-13.813745, 12.82587), (-13.674345, 10.515455))
            ThreePointArc((-13.674345, 10.515455), (-11.967798, 10.285825), (-11.041226, 11.737202))
        make_face()
        with BuildLine():
            ThreePointArc((-14.548434, -2.795634), (-14.196043, -2.879992), (-13.993166, -3.18022))
            ThreePointArc((-13.993166, -3.18022), (-14.29266, -1.281551), (-14.335716, 0.640112))
            ThreePointArc((-14.335716, 0.640112), (-14.481946, 0.308581), (-14.813709, 0.162878))
            Line((-14.813709, 0.162878), (-17.249903, 0.057978))
            ThreePointArc((-17.249903, 0.057978), (-16.074304, -0.385091), (-15.581072, -1.54054))
            ThreePointArc((-15.581072, -1.54054), (-15.975537, -2.592532), (-16.964429, -3.125806))
            Line((-16.964429, -3.125806), (-14.548434, -2.795634))
        make_face()
        with BuildLine():
            ThreePointArc((-15.782152, -6.963202), (-16.466809, -9.174241), (-14.226397, -9.75562))
            ThreePointArc((-14.226397, -9.75562), (-13.671184, -9.173883), (-13.469096, -8.395525))
            ThreePointArc((-13.469096, -8.395525), (-14.226745, -7.035215), (-15.782152, -6.963202))
        make_face()
        with BuildLine():
            ThreePointArc((-14.722285, 5.580818), (-14.99947, 6.480908), (-15.734988, 7.069133))
            ThreePointArc((-15.734988, 7.069133), (-17.836236, 6.098459), (-16.769156, 4.044489))
            ThreePointArc((-16.769156, 4.044489), (-15.361815, 4.30117), (-14.722285, 5.580818))
        make_face()
        with BuildLine():
            ThreePointArc((-17.249903, 0.057978), (-18.774679, -1.683431), (-16.964429, -3.125806))
            ThreePointArc((-16.964429, -3.125806), (-15.975537, -2.592532), (-15.581072, -1.54054))
            ThreePointArc((-15.581072, -1.54054), (-16.074304, -0.385091), (-17.249903, 0.057978))
        make_face()
    extrude(amount=F1_DEPTH)


solid = f1.part
